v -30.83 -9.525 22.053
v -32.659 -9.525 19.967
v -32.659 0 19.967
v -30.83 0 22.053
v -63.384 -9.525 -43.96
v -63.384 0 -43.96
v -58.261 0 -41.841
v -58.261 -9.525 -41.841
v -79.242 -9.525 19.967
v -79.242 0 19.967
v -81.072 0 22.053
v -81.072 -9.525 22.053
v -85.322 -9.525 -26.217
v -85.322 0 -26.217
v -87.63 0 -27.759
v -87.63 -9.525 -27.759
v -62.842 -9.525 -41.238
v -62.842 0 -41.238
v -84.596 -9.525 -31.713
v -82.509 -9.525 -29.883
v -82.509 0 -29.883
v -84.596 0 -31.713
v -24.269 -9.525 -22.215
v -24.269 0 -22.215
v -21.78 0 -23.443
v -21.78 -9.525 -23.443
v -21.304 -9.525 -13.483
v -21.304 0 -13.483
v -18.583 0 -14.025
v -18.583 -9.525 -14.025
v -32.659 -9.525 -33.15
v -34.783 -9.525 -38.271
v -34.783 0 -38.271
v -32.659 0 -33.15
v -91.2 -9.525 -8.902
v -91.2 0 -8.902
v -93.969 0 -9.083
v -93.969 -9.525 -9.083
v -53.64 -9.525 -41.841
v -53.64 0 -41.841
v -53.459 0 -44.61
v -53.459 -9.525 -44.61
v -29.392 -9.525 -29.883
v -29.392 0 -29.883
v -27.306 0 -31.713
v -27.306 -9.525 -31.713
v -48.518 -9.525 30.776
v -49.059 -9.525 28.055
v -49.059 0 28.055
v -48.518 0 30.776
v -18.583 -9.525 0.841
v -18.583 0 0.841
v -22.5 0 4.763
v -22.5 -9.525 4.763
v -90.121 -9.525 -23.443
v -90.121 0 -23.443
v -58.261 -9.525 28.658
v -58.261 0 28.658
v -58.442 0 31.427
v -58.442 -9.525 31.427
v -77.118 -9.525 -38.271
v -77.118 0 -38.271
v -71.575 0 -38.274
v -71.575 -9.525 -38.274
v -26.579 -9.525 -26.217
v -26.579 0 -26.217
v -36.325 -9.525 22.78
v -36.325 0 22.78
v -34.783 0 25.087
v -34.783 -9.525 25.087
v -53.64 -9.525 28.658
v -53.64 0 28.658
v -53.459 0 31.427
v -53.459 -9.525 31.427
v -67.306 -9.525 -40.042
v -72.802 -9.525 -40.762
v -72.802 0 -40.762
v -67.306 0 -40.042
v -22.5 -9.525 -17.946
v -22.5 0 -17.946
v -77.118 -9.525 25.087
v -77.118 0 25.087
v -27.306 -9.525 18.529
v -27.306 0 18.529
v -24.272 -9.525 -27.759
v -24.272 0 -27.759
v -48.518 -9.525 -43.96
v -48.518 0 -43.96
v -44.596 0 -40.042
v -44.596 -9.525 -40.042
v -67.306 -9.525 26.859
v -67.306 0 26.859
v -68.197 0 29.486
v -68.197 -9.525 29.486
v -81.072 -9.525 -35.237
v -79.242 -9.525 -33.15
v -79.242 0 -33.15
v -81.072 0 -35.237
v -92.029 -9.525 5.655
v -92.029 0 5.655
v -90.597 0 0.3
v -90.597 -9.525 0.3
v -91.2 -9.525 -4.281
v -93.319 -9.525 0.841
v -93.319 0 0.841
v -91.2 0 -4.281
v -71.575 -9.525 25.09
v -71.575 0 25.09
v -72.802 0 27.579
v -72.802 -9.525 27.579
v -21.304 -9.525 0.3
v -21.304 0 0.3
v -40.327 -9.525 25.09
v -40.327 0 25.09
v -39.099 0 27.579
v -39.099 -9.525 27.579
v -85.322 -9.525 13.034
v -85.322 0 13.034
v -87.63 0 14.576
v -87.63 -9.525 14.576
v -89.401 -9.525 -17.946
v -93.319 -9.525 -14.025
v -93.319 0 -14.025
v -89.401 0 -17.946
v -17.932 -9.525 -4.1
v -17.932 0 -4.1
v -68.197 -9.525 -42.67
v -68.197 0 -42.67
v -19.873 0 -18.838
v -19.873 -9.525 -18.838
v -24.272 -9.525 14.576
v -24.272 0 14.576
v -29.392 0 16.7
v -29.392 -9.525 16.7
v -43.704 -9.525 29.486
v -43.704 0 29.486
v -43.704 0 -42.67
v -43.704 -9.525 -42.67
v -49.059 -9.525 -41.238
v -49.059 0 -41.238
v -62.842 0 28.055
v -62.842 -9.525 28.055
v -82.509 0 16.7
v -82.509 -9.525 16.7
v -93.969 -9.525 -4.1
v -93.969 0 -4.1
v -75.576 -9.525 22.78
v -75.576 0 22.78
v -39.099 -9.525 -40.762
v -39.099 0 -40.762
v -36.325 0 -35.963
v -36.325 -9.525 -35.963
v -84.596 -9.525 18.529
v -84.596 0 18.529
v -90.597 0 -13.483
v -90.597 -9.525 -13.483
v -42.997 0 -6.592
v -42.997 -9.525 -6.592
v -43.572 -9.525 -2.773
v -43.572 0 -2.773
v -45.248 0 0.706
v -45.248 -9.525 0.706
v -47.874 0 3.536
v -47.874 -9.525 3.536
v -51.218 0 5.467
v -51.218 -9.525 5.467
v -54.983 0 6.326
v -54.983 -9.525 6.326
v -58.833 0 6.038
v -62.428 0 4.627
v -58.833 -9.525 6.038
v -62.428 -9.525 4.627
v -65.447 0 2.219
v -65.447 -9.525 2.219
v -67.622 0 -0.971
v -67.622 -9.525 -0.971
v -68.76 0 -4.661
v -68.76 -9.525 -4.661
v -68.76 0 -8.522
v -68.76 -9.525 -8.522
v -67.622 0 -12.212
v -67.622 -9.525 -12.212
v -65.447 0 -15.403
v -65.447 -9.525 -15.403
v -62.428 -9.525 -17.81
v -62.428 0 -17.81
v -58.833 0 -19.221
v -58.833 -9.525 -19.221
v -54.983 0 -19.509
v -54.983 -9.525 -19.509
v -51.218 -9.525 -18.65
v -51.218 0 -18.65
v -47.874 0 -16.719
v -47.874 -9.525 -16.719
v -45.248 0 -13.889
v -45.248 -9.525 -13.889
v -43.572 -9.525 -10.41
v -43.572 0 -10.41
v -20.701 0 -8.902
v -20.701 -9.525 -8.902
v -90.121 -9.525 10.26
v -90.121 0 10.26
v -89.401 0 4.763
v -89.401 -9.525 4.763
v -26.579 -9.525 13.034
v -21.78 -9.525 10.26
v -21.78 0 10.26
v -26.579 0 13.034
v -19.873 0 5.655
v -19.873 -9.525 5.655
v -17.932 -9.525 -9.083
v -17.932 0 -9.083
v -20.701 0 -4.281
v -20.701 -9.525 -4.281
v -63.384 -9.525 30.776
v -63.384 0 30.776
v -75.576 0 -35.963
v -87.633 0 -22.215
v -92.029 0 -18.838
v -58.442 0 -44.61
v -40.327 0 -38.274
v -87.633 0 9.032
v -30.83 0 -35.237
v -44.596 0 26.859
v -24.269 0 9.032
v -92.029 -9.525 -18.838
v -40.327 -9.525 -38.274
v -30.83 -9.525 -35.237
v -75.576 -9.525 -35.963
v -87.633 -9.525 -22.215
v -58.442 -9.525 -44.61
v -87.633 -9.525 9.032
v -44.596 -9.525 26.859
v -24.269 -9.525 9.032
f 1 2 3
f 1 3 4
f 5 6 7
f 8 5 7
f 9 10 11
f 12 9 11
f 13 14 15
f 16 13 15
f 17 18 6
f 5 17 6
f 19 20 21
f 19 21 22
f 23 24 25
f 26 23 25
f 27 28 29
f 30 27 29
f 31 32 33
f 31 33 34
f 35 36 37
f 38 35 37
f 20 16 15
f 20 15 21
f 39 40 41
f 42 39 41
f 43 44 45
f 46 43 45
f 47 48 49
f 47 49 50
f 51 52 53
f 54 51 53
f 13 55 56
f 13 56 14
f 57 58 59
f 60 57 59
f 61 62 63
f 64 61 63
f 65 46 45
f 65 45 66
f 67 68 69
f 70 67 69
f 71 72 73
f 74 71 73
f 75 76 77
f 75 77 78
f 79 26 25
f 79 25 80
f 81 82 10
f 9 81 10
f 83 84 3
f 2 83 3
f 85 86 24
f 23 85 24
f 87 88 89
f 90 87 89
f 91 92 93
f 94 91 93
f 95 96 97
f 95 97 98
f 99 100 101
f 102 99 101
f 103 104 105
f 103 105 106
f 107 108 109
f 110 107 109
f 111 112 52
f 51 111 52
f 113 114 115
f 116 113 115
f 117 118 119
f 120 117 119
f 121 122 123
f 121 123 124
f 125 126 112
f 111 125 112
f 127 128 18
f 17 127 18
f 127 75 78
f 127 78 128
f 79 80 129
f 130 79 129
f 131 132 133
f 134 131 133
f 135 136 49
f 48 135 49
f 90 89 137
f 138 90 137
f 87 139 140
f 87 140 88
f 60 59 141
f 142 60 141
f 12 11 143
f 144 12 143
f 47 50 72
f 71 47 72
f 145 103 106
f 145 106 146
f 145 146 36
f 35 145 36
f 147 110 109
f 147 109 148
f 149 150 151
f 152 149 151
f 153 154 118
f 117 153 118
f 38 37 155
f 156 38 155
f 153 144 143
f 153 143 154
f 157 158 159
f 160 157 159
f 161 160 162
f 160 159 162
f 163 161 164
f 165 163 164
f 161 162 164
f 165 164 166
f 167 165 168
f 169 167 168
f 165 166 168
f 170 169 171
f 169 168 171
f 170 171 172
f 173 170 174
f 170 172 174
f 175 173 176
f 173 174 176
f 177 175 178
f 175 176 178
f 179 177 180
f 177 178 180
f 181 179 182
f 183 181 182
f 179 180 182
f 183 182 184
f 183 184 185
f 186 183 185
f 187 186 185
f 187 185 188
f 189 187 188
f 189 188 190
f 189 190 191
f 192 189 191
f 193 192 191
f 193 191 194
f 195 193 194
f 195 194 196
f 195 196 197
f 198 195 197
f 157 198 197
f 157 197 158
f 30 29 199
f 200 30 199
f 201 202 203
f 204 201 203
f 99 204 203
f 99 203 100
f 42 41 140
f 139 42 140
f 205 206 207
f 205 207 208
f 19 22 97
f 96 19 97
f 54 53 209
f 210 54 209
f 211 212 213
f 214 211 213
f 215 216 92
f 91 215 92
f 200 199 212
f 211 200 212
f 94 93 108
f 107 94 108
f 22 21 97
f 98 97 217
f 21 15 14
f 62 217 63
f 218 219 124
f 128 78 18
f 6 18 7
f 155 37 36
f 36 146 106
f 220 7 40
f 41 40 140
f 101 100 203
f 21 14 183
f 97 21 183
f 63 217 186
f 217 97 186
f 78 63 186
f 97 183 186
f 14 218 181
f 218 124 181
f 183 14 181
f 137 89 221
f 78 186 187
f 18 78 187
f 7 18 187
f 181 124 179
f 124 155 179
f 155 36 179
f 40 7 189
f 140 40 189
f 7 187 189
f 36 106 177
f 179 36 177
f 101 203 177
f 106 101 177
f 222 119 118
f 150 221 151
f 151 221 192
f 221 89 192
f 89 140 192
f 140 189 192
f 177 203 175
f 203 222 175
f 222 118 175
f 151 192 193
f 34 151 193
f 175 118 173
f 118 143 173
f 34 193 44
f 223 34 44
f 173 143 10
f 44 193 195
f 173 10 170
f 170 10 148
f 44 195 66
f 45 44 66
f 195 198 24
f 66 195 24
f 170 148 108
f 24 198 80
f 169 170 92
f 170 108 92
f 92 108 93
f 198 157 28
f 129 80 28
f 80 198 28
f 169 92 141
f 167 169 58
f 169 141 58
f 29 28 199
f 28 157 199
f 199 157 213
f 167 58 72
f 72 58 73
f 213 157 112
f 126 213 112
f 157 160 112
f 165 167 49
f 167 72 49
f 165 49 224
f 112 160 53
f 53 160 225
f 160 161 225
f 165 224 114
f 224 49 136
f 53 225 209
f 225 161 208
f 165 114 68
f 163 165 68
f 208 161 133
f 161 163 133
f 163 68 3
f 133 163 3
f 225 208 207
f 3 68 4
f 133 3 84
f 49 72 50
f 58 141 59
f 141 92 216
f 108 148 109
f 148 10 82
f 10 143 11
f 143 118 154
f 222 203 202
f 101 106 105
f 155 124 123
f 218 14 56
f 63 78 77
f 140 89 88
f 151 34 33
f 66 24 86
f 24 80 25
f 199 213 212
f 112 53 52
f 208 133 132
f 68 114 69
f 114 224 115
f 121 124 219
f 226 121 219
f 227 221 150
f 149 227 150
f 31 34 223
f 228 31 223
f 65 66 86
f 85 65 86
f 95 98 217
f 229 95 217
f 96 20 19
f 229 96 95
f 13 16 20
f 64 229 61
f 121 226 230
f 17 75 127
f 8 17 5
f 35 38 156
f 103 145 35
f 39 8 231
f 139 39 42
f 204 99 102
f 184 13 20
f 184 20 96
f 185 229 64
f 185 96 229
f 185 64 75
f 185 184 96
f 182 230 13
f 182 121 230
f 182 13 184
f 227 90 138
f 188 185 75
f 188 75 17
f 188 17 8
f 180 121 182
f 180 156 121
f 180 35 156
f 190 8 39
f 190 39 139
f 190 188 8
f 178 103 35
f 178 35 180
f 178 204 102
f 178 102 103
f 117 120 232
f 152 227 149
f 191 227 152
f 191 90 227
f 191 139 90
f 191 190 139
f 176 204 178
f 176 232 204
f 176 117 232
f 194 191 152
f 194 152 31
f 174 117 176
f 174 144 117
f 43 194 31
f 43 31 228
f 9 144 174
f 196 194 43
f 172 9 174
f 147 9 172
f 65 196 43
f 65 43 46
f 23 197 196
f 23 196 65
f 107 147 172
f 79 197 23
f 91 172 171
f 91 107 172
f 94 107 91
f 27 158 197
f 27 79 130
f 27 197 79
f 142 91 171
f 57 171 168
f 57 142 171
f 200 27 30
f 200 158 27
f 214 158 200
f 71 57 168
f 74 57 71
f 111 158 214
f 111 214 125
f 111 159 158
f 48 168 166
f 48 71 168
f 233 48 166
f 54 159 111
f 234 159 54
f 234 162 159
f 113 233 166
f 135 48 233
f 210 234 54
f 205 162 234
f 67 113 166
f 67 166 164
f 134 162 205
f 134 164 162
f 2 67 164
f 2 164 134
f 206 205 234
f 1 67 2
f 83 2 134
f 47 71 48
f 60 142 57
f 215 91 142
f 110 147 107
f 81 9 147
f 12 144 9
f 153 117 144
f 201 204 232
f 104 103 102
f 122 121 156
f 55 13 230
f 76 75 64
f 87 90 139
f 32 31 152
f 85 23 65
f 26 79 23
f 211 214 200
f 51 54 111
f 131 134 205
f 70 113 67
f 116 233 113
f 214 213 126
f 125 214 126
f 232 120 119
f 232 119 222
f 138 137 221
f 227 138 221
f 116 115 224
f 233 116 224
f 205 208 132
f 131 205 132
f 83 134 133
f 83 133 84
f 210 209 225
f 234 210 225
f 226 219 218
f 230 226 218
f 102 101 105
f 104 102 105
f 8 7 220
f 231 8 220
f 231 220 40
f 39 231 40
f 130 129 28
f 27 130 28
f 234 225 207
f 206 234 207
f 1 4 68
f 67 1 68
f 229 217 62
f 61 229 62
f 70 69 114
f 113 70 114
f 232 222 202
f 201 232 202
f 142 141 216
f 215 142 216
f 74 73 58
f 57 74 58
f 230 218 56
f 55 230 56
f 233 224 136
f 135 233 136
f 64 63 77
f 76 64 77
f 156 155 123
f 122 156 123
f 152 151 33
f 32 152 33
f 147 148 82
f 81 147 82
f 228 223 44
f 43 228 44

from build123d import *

# Parameters (mm, degrees)
F0_R     = 8.905875
F1_DEPTH = 9.525
F2_R     = 12.954
F2_R_2   = 8.905875
F3_DEPTH = 34.29


with BuildPart() as f1:
    # F0 (on Front) → F1 (new body)
    with BuildSketch(Plane.XZ):
        Polygon((-48.517683, 30.776316), (-53.640253, 28.657804), (-53.45877, 31.42681), (-58.260996, 28.657804), (-58.442479, 31.42681), (-62.842216, 28.054681), (-63.383566, 30.776316), (-67.305504, 26.858747), (-68.197476, 29.486428), (-71.574508, 25.090476), (-72.801836, 27.579244), (-75.576176, 22.780092), (-77.117854, 25.087377), (-79.242056, 19.967169), (-81.071695, 22.053499), (-82.509411, 16.699814), (-84.595716, 18.529478), (-85.322334, 13.033934), (-87.629619, 14.575612), (-87.632718, 9.032265), (-90.121486, 10.259593), (-89.40099, 4.763262), (-92.02867, 5.655234), (-90.596923, 0.299974), (-93.318559, 0.84135), (-91.200046, -4.281246), (-93.969053, -4.099738), (-91.200046, -8.901963), (-93.969053, -9.083472), (-90.596923, -13.483184), (-93.318559, -14.024534), (-89.40099, -17.946472), (-92.02867, -18.838443), (-87.632718, -22.215475), (-90.121486, -23.442803), (-85.322334, -26.217143), (-87.629619, -27.758822), (-82.509411, -29.883024), (-84.595716, -31.712687), (-79.242056, -33.150378), (-81.071695, -35.236709), (-75.576176, -35.963301), (-77.117854, -38.270586), (-71.574508, -38.273685), (-72.801836, -40.762453), (-67.305504, -40.041957), (-68.197476, -42.669638), (-62.842216, -41.237891), (-63.383566, -43.959526), (-58.260996, -41.841014), (-58.442479, -44.61002), (-53.640253, -41.841014), (-53.45877, -44.61002), (-49.059059, -41.237891), (-48.517683, -43.959526), (-44.595771, -40.041957), (-43.703799, -42.669638), (-40.326767, -38.273685), (-39.099439, -40.762453), (-36.325073, -35.963301), (-34.783395, -38.270586), (-32.659218, -33.150378), (-30.829555, -35.236709), (-29.391864, -29.883024), (-27.305533, -31.712687), (-26.578916, -26.217143), (-24.27163, -27.758822), (-24.268557, -22.215475), (-21.779789, -23.442803), (-22.500285, -17.946472), (-19.872604, -18.838443), (-21.304352, -13.483184), (-18.582716, -14.024534), (-20.701203, -8.901963), (-17.932197, -9.083472), (-20.701203, -4.281246), (-17.932197, -4.099738), (-21.304352, 0.299974), (-18.582716, 0.84135), (-22.500285, 4.763262), (-19.872604, 5.655234), (-24.268557, 9.032265), (-21.779789, 10.259593), (-26.578916, 13.033934), (-24.27163, 14.575612), (-29.391864, 16.699814), (-27.305533, 18.529478), (-32.659218, 19.967169), (-30.829555, 22.053499), (-36.325073, 22.780092), (-34.783395, 25.087377), (-40.326767, 25.090476), (-39.099439, 27.579244), (-44.595771, 26.858747), (-43.703799, 29.486428), (-49.059059, 28.054681), align=None)
        with Locations((-55.950637, -6.591605)):
            Circle(F0_R, mode=Mode.SUBTRACT)
    extrude(amount=F1_DEPTH)

    # F2 (on face) → F3 (cut)
    with BuildSketch(Plane.XZ.offset(9.525)):
        with Locations((-55.950637, -6.591605)):
            Circle(F2_R)
        with Locations((-55.950637, -6.591605)):
            Circle(F2_R_2, mode=Mode.SUBTRACT)
    extrude(amount=-F3_DEPTH, mode=Mode.SUBTRACT)


solid = f1.part
